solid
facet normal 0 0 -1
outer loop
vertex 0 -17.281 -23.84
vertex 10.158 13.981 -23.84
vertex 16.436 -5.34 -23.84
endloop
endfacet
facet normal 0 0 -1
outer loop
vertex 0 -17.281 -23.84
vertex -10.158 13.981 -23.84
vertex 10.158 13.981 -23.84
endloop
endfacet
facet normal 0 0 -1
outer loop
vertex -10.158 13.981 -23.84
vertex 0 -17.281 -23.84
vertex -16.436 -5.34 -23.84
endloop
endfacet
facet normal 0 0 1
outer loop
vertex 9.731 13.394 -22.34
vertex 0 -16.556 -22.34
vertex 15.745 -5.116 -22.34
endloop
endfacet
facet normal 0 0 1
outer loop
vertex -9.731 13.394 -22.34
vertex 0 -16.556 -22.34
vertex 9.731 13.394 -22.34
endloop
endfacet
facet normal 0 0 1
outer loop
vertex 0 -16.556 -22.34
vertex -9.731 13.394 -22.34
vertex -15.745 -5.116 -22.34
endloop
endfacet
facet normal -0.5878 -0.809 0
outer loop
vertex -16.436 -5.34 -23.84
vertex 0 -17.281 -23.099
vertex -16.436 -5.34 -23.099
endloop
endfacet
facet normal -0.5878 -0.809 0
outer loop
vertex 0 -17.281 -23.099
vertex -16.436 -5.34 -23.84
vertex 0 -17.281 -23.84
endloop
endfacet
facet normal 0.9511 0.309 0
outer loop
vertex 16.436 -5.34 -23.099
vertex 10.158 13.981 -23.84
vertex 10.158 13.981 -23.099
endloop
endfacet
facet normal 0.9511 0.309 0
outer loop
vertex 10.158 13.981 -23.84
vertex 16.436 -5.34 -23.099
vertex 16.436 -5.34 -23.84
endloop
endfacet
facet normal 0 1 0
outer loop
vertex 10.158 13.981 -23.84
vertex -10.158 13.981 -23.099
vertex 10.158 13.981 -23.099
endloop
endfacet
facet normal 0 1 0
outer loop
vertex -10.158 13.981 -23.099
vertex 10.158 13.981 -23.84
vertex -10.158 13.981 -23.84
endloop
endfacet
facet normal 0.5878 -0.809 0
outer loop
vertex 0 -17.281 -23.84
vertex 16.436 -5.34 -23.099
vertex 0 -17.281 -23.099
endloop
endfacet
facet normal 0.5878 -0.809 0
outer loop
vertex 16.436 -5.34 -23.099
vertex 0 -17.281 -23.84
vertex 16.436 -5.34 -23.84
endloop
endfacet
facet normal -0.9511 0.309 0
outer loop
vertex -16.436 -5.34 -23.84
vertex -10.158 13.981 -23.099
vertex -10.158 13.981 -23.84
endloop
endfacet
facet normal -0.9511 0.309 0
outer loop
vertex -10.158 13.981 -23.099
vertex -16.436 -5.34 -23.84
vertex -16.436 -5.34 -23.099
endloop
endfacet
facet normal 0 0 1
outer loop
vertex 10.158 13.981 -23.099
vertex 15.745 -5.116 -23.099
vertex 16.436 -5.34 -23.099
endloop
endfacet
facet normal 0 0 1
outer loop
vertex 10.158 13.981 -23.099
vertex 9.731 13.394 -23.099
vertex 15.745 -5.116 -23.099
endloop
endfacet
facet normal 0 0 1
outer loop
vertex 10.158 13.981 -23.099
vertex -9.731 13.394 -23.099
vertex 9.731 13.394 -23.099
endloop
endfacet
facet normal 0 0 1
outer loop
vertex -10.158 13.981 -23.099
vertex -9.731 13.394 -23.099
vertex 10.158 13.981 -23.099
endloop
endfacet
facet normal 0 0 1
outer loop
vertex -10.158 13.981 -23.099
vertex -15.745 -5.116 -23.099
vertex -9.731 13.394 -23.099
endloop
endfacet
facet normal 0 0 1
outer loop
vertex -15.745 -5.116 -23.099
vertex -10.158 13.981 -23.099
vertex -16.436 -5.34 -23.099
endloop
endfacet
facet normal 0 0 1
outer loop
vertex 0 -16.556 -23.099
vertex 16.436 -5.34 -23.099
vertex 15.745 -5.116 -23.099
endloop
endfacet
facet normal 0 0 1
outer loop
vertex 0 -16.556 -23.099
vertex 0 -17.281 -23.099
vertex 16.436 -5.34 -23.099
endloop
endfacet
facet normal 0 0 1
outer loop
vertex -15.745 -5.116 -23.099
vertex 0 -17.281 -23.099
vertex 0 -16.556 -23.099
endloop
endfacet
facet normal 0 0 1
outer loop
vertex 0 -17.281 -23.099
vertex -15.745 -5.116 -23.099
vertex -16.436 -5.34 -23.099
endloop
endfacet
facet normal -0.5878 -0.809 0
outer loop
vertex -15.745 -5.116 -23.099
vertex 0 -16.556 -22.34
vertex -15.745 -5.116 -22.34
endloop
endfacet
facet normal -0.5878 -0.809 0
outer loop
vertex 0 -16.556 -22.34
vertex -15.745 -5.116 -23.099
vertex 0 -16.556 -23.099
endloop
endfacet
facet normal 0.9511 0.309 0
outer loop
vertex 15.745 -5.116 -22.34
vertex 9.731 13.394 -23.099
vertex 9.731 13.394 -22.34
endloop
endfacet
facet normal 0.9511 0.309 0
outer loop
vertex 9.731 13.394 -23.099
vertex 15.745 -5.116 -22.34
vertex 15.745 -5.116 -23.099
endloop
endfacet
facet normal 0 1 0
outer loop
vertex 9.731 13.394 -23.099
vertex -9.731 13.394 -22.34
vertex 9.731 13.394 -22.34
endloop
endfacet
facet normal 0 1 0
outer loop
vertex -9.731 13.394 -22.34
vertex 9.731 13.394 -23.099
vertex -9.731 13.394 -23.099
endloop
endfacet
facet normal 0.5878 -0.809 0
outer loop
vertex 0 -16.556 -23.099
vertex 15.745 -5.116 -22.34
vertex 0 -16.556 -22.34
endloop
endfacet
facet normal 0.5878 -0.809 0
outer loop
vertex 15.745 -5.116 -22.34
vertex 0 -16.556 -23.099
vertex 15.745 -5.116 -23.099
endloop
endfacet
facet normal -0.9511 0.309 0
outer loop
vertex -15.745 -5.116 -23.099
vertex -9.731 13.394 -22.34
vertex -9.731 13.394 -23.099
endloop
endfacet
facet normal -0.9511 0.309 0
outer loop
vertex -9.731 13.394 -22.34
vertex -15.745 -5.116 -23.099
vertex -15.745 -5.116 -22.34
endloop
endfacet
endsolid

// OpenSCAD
hauteurExt = 47.679;
epaisseurParoi = 1.5;
diametreTrouBouchon = 1.6;
r = 0.19; // résolution d'impression sur l'axe Z
echelleReductionAjustementBouchon = 0.975;
hauteurInt = hauteurExt - 2 * epaisseurParoi;

//dode_creux();
//decoupe_bouchon();
//corps_ouvert();
//bouchon_avec_attache();
bouchon();
//bouchon_trou();

module corps_ouvert() {
	difference() {
		dode_creux();
		decoupe_bouchon();
	}
}

module bouchon_avec_attache() {
	scale([echelleReductionAjustementBouchon, echelleReductionAjustementBouchon, 0.995])
	union () {
		intersection() {
			dode_creux();
			decoupe_bouchon();
		}
		translate([0, 0, hauteurExt/2])
		rotate([90, 0, 54])
		rotate_extrude(convexity = 10, $fn=40)
		translate([1, 0, 0])
		circle(r = 0.5, $fn=40);
	}
}

module bouchon_trou() {
	scale([echelleReductionAjustementBouchon, echelleReductionAjustementBouchon, 1])
	difference () {
		intersection() {
			dode_creux();
			decoupe_bouchon();
		}
		translate([0, 0, hauteurExt/2.5])
		cylinder(30, r=diametreTrouBouchon/2, $fn=22);
	}
}

module bouchon() {
    rotate([0,180,0])
	scale([echelleReductionAjustementBouchon, echelleReductionAjustementBouchon, 1])
	difference () {
		intersection() {
			dode_creux();
			decoupe_bouchon();
		}
	}
}

module dode_creux() {
	difference() {
		dodecahedron(hauteurExt);
		dodecahedron(hauteurInt);
	}
}

module decoupe_bouchon() {
    distance = hauteurInt/2+4*r;
	rotate([0,0,54]) translate([0,0,distance])
		cylinder(epaisseurParoi, r=hauteurExt/2.69, $fn=5);
	rotate([0,0,54]) translate([0,0,distance-epaisseurParoi])
		cylinder(epaisseurParoi, r=hauteurExt/2.58-epaisseurParoi, $fn=5);
}

module dodecahedron(height) {
	scale([height,height,height]) {
		intersection() {
			cube([2,2,1], center = true); 
			intersection_for(i=[0:4]) { 
				rotate([0,0,72*i])
				rotate([116.565,0,0])
					cube([2,2,1], center = true); 
			}
		}
	}
}
